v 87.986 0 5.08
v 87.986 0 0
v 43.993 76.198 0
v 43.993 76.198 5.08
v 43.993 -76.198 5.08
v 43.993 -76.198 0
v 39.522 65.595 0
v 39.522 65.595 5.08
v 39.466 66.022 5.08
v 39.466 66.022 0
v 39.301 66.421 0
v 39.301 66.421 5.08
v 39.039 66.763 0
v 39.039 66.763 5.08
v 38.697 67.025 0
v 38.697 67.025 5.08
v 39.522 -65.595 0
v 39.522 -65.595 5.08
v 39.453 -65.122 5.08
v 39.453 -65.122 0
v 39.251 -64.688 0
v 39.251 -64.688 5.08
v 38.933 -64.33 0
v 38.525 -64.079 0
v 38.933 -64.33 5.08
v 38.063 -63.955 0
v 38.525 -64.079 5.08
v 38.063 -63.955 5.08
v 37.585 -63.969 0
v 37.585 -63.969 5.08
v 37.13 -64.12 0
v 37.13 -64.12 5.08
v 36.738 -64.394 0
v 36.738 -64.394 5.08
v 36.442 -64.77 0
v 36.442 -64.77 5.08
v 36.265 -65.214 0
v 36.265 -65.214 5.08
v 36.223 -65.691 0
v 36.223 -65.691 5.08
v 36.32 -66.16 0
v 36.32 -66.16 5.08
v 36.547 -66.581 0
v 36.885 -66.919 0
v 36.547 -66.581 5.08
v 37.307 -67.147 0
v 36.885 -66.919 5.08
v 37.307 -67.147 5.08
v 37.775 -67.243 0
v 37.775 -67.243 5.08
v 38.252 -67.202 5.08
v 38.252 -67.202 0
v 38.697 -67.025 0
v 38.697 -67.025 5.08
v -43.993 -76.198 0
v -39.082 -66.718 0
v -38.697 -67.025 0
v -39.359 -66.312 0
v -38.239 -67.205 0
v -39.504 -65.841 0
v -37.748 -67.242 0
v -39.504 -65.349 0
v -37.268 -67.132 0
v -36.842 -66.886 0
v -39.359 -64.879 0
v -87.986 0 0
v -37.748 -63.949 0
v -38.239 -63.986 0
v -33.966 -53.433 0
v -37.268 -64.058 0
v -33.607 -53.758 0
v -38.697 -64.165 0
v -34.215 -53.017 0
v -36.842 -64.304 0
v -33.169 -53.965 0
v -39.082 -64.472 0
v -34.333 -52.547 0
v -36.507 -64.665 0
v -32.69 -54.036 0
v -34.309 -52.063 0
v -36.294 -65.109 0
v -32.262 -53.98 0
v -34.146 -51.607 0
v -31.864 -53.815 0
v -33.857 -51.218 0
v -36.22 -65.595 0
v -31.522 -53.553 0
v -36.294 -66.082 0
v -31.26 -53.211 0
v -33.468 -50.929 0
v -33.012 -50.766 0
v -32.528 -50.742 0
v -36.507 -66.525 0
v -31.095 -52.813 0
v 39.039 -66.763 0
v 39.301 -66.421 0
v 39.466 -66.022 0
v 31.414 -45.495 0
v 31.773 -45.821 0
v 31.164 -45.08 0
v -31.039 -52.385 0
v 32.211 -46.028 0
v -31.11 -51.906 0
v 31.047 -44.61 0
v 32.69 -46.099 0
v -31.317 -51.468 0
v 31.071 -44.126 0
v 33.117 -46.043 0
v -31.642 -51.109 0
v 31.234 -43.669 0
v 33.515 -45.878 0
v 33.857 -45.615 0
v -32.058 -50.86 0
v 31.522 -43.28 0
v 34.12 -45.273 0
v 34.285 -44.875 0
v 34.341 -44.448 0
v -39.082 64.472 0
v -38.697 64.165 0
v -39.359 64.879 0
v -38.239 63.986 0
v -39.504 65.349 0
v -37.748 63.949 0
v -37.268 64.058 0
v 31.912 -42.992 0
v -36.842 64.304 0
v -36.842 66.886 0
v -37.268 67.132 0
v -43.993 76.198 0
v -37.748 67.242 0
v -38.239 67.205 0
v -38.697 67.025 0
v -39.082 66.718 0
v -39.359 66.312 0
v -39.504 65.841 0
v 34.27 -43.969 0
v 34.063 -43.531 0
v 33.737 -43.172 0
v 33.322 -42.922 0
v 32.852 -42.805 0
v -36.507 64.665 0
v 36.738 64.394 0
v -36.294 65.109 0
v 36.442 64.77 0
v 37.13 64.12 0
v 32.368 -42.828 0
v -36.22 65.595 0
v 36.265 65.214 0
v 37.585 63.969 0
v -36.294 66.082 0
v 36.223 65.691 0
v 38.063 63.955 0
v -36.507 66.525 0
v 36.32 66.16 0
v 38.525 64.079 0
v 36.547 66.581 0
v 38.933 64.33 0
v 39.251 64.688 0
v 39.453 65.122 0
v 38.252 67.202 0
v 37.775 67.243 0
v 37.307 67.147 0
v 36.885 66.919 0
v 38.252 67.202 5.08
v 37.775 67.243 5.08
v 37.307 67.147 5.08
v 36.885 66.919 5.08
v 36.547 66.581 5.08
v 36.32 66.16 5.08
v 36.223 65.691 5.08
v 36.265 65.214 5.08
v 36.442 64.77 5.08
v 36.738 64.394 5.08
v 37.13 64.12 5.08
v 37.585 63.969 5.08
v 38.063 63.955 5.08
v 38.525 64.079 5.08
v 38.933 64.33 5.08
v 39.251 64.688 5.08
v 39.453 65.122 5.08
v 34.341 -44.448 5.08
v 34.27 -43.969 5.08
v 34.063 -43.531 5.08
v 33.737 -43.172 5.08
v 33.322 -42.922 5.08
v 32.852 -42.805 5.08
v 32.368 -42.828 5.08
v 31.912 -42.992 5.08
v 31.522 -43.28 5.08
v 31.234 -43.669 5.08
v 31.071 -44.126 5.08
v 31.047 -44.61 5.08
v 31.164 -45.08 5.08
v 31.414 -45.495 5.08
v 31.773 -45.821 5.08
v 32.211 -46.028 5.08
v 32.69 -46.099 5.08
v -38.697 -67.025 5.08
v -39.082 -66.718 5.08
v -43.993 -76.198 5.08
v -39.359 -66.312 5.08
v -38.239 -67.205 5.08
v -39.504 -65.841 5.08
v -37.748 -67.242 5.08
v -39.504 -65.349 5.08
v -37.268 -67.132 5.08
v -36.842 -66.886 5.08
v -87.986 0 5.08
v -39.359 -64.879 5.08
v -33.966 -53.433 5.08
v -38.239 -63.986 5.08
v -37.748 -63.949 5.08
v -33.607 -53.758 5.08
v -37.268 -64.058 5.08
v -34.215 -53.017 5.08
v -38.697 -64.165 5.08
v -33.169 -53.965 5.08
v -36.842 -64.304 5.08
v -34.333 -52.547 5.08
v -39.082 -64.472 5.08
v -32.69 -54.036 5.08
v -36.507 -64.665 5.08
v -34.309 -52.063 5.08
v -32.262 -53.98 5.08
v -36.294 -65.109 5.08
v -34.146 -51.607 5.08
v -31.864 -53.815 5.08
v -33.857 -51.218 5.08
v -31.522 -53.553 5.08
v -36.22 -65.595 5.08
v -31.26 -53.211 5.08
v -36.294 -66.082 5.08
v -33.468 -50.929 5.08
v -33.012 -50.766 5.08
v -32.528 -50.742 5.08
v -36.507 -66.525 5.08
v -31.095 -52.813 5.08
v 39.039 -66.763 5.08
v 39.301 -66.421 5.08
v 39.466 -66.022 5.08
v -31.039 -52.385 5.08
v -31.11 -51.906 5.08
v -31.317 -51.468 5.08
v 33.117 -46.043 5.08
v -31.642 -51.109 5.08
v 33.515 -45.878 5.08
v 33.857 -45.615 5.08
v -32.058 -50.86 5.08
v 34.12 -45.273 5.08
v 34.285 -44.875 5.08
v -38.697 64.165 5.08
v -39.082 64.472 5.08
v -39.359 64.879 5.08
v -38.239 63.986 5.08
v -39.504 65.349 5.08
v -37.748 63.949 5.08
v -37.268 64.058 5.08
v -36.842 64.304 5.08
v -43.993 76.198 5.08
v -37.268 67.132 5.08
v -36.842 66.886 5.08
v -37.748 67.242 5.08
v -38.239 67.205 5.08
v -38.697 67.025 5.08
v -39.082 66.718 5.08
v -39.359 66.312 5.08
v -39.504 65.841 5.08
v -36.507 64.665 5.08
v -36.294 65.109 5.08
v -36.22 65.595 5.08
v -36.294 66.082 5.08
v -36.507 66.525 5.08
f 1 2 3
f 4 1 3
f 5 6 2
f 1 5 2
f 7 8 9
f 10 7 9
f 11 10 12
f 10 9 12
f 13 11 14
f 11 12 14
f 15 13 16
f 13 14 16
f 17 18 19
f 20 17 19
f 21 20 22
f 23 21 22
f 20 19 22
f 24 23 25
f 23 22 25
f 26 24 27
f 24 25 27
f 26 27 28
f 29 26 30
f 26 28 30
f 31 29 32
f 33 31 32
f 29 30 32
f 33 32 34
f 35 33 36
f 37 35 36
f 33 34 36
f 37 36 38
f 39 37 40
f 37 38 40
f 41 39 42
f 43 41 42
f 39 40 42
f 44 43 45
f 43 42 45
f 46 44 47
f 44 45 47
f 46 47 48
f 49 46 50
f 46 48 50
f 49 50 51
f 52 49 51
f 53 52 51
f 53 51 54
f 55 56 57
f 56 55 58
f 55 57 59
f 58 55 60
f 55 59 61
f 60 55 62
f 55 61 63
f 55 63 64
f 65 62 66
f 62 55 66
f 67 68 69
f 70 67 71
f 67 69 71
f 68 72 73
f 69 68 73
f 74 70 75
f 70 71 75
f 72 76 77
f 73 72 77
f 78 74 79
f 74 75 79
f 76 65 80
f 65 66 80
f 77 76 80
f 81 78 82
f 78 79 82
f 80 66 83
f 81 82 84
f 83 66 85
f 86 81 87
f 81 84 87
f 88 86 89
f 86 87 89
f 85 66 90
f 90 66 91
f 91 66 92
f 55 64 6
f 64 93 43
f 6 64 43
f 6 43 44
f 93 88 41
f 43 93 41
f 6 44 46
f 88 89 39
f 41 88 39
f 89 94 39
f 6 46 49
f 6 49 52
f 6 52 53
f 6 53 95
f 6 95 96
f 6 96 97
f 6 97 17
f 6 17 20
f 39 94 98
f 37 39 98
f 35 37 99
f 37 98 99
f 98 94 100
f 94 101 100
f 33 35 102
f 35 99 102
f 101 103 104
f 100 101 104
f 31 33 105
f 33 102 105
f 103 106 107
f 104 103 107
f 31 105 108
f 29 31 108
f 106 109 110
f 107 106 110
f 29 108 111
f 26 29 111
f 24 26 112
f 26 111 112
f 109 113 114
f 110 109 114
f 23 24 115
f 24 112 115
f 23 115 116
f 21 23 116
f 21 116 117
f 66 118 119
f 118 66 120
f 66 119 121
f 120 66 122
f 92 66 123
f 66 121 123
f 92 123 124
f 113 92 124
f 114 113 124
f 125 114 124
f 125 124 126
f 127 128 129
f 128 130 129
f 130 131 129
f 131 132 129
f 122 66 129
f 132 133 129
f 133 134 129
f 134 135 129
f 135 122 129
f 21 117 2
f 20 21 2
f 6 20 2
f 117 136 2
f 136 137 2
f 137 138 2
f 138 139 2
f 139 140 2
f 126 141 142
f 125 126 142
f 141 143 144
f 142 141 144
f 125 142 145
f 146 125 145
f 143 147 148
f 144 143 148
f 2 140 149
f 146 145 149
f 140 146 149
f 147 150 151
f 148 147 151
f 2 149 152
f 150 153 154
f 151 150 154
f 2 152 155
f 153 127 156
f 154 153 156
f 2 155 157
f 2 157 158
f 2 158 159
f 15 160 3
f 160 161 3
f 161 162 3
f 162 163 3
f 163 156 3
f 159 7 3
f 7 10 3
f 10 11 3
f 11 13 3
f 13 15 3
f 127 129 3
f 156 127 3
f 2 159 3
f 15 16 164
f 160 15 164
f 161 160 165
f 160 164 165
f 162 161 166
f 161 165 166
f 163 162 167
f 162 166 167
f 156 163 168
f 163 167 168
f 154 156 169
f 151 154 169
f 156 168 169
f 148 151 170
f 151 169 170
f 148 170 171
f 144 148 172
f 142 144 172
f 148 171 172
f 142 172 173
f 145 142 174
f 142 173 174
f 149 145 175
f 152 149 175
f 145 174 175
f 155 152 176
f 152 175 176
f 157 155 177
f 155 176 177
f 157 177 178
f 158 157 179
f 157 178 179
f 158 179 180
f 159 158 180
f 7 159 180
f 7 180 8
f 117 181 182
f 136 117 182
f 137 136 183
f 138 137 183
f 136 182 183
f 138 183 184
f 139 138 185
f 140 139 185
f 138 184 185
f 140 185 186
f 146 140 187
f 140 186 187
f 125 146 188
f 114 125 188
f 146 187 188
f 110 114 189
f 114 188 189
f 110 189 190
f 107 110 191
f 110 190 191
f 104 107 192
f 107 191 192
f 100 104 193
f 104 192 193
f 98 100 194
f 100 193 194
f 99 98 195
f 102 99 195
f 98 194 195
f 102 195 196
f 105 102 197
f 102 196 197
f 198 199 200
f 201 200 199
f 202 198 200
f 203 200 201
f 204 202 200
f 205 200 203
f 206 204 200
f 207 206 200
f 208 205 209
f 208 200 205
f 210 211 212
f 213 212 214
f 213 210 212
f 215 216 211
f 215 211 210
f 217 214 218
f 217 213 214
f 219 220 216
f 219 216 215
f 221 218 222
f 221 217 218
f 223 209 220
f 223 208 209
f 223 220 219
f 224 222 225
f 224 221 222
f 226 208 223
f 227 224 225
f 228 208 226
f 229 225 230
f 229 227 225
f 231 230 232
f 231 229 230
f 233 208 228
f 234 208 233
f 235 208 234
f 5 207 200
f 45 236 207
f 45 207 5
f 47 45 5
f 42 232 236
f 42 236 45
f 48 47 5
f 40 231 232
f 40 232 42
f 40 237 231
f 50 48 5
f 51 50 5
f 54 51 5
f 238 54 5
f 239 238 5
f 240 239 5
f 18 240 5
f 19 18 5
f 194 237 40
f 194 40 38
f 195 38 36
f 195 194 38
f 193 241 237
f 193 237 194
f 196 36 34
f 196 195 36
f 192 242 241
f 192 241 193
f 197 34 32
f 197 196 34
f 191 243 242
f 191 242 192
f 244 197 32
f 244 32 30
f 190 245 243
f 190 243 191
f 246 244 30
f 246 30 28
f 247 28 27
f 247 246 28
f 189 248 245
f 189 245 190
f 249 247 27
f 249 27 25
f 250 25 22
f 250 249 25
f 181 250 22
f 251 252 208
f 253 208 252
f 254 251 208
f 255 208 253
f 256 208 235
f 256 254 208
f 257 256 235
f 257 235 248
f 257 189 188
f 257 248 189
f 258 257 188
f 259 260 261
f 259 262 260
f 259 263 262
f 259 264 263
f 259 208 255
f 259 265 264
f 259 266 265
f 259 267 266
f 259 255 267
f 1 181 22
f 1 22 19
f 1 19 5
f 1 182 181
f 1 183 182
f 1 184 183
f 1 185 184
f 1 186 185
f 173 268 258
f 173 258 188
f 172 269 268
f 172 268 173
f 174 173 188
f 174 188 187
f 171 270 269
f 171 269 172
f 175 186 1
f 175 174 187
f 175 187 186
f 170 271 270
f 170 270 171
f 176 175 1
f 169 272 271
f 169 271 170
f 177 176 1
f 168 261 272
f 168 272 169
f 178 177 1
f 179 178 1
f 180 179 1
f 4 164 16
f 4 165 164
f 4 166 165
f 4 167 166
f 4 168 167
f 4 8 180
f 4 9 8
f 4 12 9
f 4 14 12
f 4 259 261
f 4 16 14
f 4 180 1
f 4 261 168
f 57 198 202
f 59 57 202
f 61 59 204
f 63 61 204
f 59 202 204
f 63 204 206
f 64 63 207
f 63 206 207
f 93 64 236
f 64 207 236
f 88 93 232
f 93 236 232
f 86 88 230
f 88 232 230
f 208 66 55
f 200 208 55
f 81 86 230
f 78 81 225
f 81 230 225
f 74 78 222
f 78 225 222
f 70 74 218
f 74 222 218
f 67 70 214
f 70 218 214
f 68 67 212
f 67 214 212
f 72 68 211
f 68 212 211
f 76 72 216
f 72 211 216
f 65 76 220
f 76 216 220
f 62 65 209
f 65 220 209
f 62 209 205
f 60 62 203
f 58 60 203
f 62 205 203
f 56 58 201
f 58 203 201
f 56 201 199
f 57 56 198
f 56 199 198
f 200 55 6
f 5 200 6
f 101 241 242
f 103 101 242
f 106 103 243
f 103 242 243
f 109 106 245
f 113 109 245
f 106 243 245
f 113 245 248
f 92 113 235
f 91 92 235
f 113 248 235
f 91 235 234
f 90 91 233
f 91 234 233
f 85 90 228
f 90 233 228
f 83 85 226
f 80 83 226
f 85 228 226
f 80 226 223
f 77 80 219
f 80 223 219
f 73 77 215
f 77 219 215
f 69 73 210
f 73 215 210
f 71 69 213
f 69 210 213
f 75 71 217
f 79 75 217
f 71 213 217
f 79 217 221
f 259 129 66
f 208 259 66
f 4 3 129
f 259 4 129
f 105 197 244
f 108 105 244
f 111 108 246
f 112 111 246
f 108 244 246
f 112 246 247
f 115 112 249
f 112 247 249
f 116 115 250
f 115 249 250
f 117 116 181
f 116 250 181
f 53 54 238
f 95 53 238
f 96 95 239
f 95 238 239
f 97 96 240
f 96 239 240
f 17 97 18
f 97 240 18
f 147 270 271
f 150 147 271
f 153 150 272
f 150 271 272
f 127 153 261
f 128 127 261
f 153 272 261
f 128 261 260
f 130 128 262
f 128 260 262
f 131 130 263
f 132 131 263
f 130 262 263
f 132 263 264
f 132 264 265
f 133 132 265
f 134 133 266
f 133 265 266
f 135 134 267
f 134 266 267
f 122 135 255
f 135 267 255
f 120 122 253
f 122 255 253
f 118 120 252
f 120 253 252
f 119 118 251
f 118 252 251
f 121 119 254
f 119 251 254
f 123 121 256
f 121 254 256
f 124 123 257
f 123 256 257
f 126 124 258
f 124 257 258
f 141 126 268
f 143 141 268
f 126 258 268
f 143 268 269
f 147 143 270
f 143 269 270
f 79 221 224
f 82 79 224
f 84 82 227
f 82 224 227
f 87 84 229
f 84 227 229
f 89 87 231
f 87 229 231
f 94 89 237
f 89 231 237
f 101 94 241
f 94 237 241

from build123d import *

# Parameters (mm, degrees)
F1_DEPTH = 5.08
F3_DEPTH = 25.4
F5_DEPTH = 25.4
F7_DEPTH = 25.4


with BuildPart() as f1:
    # F0 (on Top) → F1 (new body)
    with BuildSketch(Plane.XY):
        Polygon((43.9928, 76.197765), (-43.9928, 76.197765), (-87.9856, 0), (-43.9928, -76.197765), (43.9928, -76.197765), (87.9856, 0), align=None)
    extrude(amount=F1_DEPTH)

    # F2 (on face) → F3 (cut)
    with BuildSketch(Plane.XY.offset(5.08)):
        with BuildLine():
            ThreePointArc((-38.6969, 67.024997), (-38.6969, 64.165381), (-36.2204, 65.595189))
            ThreePointArc((-36.2204, 65.595189), (-37.0459, 67.024997), (-38.6969, 67.024997))
        make_face()
        with BuildLine():
            ThreePointArc((38.6969, 67.024997), (36.441592, 64.769689), (39.5224, 65.595189))
            ThreePointArc((39.5224, 65.595189), (39.301208, 66.420689), (38.6969, 67.024997))
        make_face()
        with BuildLine():
            ThreePointArc((38.6969, -67.024997), (39.301208, -66.420689), (39.5224, -65.595189))
            ThreePointArc((39.5224, -65.595189), (36.441592, -64.769689), (38.6969, -67.024997))
        make_face()
        with BuildLine():
            ThreePointArc((-38.6969, -67.024997), (-37.0459, -67.024997), (-36.2204, -65.595189))
            ThreePointArc((-36.2204, -65.595189), (-38.6969, -64.165381), (-38.6969, -67.024997))
        make_face()
    extrude(amount=-F3_DEPTH, mode=Mode.SUBTRACT)

    # F4 (on face) → F5 (cut)
    with BuildSketch(Plane.XY.offset(5.08)):
        with BuildLine():
            ThreePointArc((32.6898, -46.098765), (33.857233, -45.615198), (34.3408, -44.447765))
            ThreePointArc((34.3408, -44.447765), (31.522367, -43.280331), (32.6898, -46.098765))
        make_face()
    extrude(amount=-F5_DEPTH, mode=Mode.SUBTRACT)

    # F6 (on face) → F7 (cut)
    with BuildSketch(Plane.XY.offset(5.08)):
        with BuildLine():
            ThreePointArc((-31.0388, -52.385265), (-33.857233, -51.217831), (-32.6898, -54.036265))
            ThreePointArc((-32.6898, -54.036265), (-31.522367, -53.552698), (-31.0388, -52.385265))
        make_face()
    extrude(amount=-F7_DEPTH, mode=Mode.SUBTRACT)


solid = f1.part
